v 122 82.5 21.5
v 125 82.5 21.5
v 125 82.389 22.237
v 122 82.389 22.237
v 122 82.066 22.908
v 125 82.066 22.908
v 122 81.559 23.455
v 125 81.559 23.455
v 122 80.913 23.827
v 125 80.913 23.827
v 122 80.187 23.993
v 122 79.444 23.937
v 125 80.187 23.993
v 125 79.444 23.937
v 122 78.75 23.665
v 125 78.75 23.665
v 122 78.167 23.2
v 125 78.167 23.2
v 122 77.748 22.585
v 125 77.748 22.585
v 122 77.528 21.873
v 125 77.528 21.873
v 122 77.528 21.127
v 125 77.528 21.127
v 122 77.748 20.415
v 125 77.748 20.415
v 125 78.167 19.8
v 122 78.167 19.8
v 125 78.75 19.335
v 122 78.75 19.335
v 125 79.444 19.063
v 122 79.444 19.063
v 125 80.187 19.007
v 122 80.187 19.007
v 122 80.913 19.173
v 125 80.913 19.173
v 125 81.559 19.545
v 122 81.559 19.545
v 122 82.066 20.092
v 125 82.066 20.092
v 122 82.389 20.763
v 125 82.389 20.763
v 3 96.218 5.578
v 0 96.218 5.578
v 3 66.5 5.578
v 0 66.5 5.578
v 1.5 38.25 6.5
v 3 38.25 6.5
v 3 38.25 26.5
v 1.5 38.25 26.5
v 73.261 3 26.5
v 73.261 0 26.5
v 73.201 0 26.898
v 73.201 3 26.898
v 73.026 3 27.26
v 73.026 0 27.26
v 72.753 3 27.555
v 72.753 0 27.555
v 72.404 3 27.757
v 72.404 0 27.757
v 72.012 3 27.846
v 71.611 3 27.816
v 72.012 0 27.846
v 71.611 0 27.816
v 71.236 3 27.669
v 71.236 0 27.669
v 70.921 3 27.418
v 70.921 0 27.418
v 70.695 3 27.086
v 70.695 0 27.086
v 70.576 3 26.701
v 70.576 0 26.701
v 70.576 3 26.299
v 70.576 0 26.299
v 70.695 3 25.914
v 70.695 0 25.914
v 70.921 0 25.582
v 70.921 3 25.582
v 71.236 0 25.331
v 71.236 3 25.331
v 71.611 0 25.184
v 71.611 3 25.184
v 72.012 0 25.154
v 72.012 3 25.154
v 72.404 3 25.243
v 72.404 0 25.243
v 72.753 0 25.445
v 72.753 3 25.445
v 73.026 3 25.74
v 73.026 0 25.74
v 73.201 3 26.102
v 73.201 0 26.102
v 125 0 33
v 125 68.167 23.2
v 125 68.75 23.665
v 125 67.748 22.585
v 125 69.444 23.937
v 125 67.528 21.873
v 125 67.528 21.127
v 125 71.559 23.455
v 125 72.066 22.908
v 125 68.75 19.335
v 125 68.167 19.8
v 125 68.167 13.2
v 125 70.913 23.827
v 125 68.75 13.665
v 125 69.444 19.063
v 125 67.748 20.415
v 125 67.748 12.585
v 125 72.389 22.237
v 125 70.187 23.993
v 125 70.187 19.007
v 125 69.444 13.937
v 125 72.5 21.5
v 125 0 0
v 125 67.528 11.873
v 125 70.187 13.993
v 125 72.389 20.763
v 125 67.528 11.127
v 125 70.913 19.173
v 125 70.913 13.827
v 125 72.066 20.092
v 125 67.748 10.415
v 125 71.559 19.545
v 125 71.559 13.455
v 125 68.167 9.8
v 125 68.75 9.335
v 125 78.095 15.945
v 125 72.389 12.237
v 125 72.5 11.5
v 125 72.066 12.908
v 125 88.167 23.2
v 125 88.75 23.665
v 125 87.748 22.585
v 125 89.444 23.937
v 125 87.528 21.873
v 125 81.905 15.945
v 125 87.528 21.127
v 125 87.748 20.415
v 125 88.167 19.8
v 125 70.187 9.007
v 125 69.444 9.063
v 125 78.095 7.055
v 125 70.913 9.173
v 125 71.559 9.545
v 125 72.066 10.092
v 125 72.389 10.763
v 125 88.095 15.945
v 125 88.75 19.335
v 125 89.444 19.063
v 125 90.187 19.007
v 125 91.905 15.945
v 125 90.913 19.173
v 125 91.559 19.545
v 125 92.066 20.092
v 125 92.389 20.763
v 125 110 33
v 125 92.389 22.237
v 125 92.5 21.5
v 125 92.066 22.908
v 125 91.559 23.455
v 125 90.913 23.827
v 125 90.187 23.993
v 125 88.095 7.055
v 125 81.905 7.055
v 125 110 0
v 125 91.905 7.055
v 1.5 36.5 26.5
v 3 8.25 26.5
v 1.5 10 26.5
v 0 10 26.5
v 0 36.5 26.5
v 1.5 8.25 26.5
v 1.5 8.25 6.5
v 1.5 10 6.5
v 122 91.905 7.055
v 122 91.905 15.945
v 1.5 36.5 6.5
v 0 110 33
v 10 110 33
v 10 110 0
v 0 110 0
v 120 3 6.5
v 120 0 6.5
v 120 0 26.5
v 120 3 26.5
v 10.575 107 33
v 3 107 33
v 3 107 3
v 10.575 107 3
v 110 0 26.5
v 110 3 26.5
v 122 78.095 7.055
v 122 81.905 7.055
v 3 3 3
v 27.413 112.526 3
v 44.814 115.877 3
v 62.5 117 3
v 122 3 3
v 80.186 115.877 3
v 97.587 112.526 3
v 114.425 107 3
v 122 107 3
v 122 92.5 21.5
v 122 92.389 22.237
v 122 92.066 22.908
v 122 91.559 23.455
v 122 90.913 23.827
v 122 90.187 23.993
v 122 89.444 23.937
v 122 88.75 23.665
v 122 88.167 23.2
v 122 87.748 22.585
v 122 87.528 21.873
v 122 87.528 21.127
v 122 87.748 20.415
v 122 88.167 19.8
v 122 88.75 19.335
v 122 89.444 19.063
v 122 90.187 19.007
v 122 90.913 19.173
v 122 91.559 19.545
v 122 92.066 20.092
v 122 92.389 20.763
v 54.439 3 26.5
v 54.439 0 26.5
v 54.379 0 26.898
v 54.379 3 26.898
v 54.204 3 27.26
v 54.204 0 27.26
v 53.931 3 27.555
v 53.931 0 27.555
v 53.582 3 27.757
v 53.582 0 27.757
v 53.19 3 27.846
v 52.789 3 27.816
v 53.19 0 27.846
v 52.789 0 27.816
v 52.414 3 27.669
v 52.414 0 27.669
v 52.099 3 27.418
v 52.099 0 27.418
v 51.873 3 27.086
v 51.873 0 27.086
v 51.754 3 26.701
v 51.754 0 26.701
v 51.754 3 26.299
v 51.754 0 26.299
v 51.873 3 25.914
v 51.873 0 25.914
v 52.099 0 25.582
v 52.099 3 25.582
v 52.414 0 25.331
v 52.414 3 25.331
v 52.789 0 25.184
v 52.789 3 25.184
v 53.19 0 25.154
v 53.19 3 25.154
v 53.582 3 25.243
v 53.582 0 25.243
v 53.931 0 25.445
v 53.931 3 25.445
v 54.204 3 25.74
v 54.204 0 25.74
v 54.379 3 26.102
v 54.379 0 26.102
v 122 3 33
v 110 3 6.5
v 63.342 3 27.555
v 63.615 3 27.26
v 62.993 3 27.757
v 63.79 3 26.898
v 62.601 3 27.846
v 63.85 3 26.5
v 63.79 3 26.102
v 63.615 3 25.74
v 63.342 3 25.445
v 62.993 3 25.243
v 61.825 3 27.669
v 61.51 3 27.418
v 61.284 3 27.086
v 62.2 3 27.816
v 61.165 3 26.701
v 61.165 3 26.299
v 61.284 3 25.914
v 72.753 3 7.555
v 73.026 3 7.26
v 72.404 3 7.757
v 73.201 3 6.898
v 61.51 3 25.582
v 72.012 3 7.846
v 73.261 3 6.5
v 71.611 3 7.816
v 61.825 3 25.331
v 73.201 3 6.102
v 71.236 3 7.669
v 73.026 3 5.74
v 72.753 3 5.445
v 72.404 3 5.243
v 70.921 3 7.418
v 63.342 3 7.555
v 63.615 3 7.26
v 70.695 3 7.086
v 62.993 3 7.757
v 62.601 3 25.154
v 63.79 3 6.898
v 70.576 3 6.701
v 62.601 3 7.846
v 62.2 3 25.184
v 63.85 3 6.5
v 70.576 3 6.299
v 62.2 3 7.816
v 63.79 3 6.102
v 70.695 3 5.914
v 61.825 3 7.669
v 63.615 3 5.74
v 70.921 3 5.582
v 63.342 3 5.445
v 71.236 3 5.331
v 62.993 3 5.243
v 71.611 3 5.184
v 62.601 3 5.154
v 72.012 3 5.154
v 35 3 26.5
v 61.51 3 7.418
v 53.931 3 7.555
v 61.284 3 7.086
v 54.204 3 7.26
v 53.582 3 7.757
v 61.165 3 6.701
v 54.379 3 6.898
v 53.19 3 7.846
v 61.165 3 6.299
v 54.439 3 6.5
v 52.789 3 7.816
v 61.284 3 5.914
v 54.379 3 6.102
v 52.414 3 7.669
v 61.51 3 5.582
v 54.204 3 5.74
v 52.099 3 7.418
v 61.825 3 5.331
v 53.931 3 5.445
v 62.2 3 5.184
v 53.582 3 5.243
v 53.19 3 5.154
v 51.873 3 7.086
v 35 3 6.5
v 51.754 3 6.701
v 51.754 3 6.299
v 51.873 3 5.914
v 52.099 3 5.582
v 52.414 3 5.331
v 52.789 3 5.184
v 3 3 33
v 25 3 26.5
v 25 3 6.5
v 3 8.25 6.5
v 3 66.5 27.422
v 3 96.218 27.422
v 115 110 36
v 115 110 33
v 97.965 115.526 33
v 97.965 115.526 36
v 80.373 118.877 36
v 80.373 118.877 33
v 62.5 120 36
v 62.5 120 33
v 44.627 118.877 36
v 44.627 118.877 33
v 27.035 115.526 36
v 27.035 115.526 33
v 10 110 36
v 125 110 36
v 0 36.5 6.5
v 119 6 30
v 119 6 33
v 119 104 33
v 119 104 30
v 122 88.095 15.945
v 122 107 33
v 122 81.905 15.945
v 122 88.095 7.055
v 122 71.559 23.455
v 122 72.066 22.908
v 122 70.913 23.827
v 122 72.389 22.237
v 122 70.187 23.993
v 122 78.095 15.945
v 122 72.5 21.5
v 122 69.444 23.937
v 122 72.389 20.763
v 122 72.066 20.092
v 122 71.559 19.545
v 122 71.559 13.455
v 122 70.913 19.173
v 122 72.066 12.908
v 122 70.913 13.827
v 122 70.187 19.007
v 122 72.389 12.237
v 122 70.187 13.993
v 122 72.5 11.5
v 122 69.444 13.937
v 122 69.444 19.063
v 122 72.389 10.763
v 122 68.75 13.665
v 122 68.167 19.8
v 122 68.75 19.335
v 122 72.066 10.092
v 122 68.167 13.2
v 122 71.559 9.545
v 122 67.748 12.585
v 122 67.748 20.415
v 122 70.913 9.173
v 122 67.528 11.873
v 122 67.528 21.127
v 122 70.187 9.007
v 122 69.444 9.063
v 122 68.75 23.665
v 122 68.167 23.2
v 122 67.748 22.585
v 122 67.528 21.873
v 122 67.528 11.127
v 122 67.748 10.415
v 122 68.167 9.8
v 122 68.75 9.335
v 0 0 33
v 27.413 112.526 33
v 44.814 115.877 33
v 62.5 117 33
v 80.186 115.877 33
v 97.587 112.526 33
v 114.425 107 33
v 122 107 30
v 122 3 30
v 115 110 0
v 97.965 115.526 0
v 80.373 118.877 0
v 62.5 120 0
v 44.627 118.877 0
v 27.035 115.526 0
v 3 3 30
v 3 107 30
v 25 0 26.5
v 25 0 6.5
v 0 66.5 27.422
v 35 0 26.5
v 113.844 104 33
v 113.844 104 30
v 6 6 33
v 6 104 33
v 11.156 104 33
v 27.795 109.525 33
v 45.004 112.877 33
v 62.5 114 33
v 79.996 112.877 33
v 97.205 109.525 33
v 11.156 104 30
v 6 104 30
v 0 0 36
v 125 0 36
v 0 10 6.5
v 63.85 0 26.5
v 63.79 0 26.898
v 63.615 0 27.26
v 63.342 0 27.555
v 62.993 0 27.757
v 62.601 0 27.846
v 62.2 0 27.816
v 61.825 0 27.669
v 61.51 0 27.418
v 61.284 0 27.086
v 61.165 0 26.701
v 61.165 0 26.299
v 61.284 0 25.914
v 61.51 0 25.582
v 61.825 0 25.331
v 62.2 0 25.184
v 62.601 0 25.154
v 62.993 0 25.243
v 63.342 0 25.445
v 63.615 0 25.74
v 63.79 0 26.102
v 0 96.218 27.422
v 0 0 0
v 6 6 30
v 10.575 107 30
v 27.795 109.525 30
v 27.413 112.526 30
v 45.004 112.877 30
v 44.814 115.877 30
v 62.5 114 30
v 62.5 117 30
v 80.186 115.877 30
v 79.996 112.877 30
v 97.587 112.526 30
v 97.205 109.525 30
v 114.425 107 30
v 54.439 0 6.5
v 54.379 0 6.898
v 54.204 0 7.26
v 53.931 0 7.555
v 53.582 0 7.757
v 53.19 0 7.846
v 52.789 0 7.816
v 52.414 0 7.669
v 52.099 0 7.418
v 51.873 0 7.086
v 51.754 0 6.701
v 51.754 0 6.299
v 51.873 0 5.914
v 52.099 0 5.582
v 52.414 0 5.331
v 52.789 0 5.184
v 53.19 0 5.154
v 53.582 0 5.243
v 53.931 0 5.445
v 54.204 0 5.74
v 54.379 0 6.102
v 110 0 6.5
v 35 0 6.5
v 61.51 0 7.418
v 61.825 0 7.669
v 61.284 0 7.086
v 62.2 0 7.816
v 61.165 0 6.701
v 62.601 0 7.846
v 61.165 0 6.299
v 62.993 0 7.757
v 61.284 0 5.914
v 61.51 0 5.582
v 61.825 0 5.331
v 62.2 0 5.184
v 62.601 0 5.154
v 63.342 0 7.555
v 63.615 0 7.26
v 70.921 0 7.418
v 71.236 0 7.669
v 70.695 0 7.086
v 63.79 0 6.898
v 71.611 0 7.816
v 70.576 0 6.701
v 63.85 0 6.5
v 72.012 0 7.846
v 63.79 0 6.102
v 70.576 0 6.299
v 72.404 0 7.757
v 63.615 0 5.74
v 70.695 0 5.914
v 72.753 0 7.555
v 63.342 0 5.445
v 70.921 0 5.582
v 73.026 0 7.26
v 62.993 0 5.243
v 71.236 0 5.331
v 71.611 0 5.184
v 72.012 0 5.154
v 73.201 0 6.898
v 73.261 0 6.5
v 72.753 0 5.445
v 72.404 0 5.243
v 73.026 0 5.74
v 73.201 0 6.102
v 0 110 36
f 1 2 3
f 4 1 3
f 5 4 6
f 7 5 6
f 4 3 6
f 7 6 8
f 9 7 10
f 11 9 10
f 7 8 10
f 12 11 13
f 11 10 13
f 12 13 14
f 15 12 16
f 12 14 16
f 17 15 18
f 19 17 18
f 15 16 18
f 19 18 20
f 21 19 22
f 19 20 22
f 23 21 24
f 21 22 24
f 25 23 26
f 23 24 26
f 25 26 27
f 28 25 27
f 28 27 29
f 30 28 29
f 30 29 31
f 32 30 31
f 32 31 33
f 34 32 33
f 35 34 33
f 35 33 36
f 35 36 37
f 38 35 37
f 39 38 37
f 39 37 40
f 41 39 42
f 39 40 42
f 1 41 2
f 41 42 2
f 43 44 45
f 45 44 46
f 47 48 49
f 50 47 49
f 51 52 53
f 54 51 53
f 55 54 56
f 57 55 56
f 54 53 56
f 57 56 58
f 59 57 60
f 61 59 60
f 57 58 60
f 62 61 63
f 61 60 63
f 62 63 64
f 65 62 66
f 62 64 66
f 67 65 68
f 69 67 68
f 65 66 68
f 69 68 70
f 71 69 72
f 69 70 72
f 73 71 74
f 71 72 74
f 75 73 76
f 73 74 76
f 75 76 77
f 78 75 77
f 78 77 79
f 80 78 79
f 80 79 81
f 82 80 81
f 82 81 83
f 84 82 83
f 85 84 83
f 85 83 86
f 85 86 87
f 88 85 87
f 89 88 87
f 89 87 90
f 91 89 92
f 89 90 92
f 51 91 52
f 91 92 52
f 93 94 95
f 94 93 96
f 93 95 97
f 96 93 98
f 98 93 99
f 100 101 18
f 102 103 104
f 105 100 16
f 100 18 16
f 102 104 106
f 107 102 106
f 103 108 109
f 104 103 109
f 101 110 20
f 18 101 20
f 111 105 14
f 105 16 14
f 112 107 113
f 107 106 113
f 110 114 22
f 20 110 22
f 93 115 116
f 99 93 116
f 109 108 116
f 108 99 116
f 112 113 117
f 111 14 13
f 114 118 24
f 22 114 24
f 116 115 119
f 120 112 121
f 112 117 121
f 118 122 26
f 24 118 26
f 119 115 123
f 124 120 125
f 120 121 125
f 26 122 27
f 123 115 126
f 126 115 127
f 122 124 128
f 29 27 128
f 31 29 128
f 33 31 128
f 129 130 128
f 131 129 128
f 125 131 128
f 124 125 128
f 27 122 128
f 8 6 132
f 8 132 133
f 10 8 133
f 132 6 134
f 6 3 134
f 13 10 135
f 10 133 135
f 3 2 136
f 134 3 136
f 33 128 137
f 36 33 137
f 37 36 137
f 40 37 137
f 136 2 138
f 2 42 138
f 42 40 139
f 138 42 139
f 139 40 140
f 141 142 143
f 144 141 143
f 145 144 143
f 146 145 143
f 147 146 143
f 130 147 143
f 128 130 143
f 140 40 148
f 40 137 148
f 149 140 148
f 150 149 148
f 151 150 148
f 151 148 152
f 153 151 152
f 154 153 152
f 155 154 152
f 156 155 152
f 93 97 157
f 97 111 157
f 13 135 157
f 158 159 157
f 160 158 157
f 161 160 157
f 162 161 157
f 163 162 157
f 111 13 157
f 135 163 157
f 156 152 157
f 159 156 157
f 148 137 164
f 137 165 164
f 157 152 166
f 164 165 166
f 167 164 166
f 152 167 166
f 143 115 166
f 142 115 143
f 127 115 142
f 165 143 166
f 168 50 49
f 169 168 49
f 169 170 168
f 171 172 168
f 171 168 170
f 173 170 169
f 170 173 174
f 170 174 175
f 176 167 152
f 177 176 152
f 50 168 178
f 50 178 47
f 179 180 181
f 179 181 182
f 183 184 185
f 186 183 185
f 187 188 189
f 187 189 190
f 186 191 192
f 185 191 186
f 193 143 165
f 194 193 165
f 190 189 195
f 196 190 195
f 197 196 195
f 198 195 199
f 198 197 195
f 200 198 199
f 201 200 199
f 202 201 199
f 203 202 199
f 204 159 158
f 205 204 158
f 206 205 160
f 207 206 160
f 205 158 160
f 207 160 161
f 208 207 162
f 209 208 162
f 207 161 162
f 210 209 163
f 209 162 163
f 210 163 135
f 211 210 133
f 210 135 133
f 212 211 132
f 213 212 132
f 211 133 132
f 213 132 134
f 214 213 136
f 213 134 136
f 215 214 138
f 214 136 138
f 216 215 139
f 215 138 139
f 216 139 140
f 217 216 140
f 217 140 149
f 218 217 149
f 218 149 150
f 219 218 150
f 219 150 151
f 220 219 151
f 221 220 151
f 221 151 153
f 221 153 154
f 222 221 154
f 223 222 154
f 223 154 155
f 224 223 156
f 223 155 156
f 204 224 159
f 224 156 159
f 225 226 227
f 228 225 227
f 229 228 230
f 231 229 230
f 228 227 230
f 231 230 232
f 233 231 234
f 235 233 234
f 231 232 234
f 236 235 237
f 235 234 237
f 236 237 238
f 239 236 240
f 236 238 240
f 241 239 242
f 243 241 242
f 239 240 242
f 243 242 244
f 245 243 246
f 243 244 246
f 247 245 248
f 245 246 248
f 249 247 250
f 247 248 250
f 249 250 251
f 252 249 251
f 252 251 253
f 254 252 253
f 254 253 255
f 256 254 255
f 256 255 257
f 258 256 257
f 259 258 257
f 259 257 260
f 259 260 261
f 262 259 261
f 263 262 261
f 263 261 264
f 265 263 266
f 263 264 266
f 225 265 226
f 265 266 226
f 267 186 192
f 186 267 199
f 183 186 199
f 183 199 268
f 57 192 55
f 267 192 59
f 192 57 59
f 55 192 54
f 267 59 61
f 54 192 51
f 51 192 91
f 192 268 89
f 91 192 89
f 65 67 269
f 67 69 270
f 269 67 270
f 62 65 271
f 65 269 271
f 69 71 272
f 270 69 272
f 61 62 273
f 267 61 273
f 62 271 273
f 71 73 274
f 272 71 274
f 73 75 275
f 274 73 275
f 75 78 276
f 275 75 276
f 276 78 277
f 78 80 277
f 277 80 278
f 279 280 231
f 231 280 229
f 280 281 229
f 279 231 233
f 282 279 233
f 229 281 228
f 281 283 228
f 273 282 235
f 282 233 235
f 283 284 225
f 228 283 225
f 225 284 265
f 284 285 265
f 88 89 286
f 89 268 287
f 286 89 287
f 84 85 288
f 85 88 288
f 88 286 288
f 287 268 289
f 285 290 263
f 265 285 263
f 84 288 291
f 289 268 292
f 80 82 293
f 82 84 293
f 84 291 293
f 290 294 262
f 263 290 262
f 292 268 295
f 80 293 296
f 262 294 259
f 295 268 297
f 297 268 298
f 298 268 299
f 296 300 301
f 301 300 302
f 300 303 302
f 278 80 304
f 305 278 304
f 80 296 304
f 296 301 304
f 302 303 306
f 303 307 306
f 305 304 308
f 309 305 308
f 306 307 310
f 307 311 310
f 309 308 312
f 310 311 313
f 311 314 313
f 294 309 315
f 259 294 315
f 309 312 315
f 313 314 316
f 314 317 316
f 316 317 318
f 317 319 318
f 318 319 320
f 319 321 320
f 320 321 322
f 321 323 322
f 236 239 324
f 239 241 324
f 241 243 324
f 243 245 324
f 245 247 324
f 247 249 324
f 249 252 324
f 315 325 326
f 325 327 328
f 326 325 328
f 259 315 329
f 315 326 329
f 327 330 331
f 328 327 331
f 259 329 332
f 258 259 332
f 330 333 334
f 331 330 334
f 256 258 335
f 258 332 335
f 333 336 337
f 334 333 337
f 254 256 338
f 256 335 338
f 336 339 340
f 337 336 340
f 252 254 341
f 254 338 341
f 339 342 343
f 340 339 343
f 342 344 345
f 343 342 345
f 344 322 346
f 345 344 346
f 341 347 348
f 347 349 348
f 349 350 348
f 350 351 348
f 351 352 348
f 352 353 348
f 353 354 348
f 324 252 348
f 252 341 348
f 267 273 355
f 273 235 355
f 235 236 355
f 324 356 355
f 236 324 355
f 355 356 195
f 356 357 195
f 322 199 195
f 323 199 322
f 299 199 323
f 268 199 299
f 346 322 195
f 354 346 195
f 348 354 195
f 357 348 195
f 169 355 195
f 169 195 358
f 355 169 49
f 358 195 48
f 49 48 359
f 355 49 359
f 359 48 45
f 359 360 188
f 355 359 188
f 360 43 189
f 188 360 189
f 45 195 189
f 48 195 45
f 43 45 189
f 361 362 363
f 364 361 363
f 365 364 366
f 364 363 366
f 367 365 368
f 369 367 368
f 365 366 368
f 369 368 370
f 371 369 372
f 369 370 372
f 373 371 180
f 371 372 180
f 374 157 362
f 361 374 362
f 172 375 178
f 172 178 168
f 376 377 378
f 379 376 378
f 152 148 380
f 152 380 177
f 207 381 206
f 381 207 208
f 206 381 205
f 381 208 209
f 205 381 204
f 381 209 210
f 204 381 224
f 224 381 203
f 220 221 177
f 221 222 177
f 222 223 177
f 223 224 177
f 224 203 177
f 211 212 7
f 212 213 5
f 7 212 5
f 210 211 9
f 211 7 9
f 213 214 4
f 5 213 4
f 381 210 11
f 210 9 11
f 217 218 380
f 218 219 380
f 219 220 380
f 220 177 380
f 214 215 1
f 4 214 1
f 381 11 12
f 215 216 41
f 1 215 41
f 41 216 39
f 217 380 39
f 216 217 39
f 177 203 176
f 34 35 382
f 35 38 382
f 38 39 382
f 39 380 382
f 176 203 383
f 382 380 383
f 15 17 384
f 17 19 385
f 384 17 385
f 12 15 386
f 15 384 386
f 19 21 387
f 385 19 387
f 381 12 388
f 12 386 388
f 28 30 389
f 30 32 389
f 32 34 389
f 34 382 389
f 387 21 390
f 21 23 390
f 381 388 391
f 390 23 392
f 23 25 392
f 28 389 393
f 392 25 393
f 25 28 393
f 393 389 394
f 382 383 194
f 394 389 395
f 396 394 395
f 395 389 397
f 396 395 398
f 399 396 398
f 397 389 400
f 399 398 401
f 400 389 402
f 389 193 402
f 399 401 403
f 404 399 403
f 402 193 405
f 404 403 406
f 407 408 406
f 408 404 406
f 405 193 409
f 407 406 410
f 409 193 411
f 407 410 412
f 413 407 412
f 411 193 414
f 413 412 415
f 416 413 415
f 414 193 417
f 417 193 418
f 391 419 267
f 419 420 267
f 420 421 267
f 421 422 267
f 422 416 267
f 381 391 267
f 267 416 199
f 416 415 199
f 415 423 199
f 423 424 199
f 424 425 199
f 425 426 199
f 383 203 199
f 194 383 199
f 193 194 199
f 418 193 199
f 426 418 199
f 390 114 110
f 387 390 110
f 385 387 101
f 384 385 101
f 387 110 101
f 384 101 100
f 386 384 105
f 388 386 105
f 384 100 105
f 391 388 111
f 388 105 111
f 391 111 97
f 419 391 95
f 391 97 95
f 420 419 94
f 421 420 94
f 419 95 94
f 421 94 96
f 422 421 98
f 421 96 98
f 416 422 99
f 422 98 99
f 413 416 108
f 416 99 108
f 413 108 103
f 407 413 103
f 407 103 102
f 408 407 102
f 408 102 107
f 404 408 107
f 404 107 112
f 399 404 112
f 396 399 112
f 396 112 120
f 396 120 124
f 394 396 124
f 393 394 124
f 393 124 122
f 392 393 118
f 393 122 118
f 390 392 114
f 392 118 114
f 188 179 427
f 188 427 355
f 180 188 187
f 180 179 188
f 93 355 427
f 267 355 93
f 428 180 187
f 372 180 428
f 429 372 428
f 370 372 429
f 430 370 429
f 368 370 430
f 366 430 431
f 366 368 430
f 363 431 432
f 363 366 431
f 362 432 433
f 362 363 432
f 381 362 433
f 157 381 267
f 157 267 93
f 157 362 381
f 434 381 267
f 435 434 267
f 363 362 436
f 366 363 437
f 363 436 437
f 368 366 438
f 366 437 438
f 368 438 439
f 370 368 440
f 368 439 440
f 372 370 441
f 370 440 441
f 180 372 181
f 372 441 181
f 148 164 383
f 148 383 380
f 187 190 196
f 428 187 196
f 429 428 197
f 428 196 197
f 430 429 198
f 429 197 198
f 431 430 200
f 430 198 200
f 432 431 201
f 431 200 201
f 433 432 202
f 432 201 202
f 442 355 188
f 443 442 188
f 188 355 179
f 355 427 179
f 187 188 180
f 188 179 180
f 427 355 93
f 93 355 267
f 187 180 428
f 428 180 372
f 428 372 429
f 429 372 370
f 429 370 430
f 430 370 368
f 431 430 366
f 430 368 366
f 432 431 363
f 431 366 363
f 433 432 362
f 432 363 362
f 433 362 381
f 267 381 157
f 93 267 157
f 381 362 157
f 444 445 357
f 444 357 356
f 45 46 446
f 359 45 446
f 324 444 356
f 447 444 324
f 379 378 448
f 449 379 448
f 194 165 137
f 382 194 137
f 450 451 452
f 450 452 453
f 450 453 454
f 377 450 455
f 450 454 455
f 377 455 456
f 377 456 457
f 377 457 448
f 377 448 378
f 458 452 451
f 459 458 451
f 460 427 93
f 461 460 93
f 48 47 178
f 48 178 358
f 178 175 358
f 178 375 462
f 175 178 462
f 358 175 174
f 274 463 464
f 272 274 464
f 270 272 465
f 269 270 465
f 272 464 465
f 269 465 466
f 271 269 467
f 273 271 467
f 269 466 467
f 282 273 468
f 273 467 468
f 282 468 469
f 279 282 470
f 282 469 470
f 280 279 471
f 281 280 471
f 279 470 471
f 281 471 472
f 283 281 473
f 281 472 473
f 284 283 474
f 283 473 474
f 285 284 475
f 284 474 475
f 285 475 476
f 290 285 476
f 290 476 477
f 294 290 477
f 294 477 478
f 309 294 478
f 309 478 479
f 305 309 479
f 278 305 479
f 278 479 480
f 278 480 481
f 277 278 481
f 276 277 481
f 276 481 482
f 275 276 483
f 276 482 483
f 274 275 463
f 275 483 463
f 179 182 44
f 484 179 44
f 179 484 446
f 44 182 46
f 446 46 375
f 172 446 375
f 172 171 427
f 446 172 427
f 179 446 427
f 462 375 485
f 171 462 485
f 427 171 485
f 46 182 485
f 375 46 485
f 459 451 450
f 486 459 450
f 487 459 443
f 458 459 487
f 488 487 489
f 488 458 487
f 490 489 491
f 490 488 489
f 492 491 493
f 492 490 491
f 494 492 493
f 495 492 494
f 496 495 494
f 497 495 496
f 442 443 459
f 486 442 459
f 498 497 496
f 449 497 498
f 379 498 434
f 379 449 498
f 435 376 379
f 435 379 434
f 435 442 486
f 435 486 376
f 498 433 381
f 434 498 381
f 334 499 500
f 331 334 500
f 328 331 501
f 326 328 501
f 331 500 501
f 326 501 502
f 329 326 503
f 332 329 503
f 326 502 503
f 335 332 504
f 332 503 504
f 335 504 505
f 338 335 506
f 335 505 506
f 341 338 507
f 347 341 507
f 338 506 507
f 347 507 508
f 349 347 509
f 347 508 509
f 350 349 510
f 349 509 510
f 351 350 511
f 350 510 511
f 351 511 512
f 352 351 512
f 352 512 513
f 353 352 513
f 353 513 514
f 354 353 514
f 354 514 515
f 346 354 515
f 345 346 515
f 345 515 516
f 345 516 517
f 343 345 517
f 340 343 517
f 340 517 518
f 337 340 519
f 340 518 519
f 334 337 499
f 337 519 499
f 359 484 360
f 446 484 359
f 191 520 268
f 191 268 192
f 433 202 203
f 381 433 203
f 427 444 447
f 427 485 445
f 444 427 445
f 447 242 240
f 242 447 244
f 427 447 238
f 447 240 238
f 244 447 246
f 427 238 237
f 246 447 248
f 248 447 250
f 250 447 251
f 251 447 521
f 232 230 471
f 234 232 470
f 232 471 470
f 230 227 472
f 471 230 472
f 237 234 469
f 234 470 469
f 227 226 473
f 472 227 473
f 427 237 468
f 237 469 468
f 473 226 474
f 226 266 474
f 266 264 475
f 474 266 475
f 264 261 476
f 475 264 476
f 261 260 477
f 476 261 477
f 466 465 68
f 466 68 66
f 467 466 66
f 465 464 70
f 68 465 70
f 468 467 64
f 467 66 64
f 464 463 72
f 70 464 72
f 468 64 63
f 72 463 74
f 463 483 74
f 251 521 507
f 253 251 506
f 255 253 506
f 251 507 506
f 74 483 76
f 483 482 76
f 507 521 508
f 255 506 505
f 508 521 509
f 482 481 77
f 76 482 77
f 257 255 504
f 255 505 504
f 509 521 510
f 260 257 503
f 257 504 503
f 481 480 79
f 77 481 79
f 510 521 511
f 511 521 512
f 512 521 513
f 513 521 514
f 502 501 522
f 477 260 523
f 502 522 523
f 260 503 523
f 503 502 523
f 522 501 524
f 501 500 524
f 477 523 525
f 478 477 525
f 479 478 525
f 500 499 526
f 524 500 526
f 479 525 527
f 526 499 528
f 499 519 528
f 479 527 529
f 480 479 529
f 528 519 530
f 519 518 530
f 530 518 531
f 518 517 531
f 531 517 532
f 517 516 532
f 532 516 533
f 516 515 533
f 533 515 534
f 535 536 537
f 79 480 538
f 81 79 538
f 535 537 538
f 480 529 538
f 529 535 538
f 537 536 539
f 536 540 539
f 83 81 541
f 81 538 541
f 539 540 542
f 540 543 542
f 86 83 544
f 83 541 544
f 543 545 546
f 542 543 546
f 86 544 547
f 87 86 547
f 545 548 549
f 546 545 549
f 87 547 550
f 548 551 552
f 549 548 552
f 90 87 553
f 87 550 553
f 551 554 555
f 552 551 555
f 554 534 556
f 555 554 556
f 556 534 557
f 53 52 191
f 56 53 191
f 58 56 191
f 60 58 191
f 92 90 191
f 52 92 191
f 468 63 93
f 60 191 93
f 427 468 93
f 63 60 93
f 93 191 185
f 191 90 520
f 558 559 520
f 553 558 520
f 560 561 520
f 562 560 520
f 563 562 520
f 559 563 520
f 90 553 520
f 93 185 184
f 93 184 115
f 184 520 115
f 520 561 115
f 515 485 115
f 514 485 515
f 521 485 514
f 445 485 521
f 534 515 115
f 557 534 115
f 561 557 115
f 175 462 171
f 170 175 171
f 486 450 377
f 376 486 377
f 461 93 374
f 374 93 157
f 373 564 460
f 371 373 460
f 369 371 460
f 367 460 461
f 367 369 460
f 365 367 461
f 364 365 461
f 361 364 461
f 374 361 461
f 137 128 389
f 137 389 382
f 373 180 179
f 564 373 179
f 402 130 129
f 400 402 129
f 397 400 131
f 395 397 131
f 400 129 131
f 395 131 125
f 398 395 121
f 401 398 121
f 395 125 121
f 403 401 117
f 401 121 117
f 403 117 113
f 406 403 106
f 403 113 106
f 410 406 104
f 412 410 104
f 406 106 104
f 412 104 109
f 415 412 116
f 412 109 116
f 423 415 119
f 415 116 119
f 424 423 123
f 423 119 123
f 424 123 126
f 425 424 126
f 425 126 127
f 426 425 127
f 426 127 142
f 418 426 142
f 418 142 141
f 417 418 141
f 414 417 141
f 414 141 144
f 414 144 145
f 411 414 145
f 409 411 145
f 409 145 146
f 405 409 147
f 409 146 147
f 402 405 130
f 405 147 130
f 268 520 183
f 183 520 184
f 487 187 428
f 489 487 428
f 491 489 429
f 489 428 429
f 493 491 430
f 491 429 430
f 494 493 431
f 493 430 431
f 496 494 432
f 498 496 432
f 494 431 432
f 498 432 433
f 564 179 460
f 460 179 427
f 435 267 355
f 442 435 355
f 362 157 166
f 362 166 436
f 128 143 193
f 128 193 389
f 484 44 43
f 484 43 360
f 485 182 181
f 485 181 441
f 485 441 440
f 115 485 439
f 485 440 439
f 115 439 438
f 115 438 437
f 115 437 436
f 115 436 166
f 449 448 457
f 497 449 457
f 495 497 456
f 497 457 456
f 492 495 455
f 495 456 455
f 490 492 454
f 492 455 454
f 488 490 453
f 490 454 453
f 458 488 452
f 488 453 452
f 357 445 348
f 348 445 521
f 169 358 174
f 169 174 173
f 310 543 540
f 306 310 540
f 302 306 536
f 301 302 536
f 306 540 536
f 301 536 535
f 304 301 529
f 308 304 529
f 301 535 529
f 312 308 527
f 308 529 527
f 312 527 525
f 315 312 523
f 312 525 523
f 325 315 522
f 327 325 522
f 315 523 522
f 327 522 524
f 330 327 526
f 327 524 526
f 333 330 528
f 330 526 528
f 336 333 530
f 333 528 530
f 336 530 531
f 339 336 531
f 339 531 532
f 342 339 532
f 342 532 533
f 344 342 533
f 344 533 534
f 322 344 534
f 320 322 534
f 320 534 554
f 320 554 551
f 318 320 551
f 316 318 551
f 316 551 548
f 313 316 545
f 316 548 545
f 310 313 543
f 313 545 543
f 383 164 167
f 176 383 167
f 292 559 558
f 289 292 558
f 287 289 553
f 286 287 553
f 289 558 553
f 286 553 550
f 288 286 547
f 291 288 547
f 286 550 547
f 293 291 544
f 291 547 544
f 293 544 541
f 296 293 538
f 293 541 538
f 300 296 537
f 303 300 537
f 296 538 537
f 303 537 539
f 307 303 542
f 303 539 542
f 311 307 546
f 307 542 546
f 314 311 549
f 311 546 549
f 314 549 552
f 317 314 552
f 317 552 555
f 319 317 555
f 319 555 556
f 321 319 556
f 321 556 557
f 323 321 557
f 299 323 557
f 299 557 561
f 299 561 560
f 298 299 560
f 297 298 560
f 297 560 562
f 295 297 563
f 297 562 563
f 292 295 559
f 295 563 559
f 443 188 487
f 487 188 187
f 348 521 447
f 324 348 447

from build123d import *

# Parameters (mm, degrees)
F1_DEPTH  = 3
F3_DEPTH  = 30
F4_W      = 26.5
F4_H      = 20
F5_DEPTH  = 3
F6_W      = 30
F6_H      = 20
F7_DEPTH  = 1.5
F8_W      = 29.718
F8_H      = 21.844
F9_DEPTH  = 3
F10_W     = 10
F10_H     = 20
F11_DEPTH = 3
F12_R     = 2.5
F12_W     = 3.81
F12_H     = 8.89
F13_DEPTH = 3
F15_DEPTH = 3
F17_DEPTH = 3
F18_R     = 1.35
F19_DEPTH = 3


with BuildPart() as f1:
    # F0 (on Top) → F1 (new body)
    with BuildSketch(Plane.XY):
        with BuildLine():
            Line((0, 110), (0, 0))
            Line((0, 0), (125, 0))
            Line((125, 0), (125, 110))
            Line((125, 110), (115, 110))
            ThreePointArc((115, 110), (62.5, 120), (10, 110))
            Line((10, 110), (0, 110))
        make_face()
    extrude(amount=F1_DEPTH)

    # F2 (on face) → F3 (join)
    with BuildSketch(Plane.XY.offset(3)):
        with BuildLine():
            ThreePointArc((115, 110), (62.5, 120), (10, 110))
            Line((10, 110), (0, 110))
            Line((0, 110), (0, 0))
            Line((0, 0), (125, 0))
            Line((125, 0), (125, 110))
            Line((125, 110), (115, 110))
        make_face()
        with BuildLine():
            Line((122, 107), (122, 3))
            Line((122, 3), (3, 3))
            Line((3, 3), (3, 107))
            Line((3, 107), (10.5745727028, 107))
            ThreePointArc((10.5745727028, 107), (62.5, 117), (114.4254272972, 107))
            Line((114.4254272972, 107), (122, 107))
        make_face(mode=Mode.SUBTRACT)
    extrude(amount=F3_DEPTH)

    # F4 (on face) → F5 (cut, through all)
    with BuildSketch(Plane(origin=(0, 0, 0), x_dir=(0, -1, 0), z_dir=(-1, 0, 0))):
        with Locations((-23.25, 16.5)):
            Rectangle(F4_W, F4_H)
    extrude(amount=-F5_DEPTH, mode=Mode.SUBTRACT)

    # F6 (on face) → F7 (cut)
    with BuildSketch(Plane.YZ.offset(3)):
        with Locations((23.25, 16.5)):
            Rectangle(F6_W, F6_H)
    extrude(amount=-F7_DEPTH, mode=Mode.SUBTRACT)

    # F8 (on face) → F9 (cut, through all)
    with BuildSketch(Plane(origin=(0, 0, 0), x_dir=(0, -1, 0), z_dir=(-1, 0, 0))):
        with Locations((-81.359, 16.5)):
            Rectangle(F8_W, F8_H)
    extrude(amount=-F9_DEPTH, mode=Mode.SUBTRACT)

    # F10 (on face) → F11 (cut, through all)
    with BuildSketch(Plane.XZ):
        with Locations((30, 16.5)):
            Rectangle(F10_W, F10_H)
        with Locations((115, 16.5)):
            Rectangle(F10_W, F10_H)
    extrude(amount=-F11_DEPTH, mode=Mode.SUBTRACT)

    # F12 (on face) → F13 (cut, through all)
    with BuildSketch(Plane.YZ.offset(125)):
        with Locations((90, 21.5)):
            Circle(F12_R)
        with Locations((80, 21.5)):
            Circle(F12_R)
        with Locations((70, 21.5)):
            Circle(F12_R)
        with Locations((70, 11.5)):
            Circle(F12_R)
        with Locations((80, 11.5)):
            Rectangle(F12_W, F12_H)
        with Locations((90, 11.5)):
            Rectangle(F12_W, F12_H)
    extrude(amount=-F13_DEPTH, mode=Mode.SUBTRACT)

    # F18 (on face) → F19 (cut, through all)
    with BuildSketch(Plane.XZ):
        with Locations((53.089, 6.5)):
            Circle(F18_R)
        with Locations((53.089, 26.5)):
            Circle(F18_R)
        with Locations((62.5, 6.5)):
            Circle(F18_R)
        with Locations((62.5, 26.5)):
            Circle(F18_R)
        with Locations((71.911, 6.5)):
            Circle(F18_R)
        with Locations((71.911, 26.5)):
            Circle(F18_R)
    extrude(amount=-F19_DEPTH, mode=Mode.SUBTRACT)


with BuildPart() as f15:
    # F14 (on face) → F15 (new body)
    with BuildSketch(Plane.XY.offset(33)):
        with BuildLine():
            Line((0, 110), (0, 0))
            Line((0, 0), (125, 0))
            Line((125, 0), (125, 110))
            Line((125, 110), (115, 110))
            ThreePointArc((115, 110), (62.5, 120), (10, 110))
            Line((10, 110), (0, 110))
        make_face()
    extrude(amount=F15_DEPTH)

    # F16 (on face) → F17 (join)
    with BuildSketch(Plane(origin=(0, 0, 33), x_dir=(1, 0, 0), z_dir=(0, 0, -1))):
        with BuildLine():
            Line((3, -3), (3, -107))
            Line((3, -107), (10.5745727028, -107))
            ThreePointArc((10.5745727028, -107), (62.5, -117), (114.4254272972, -107))
            Line((114.4254272972, -107), (122, -107))
            Line((122, -107), (122, -3))
            Line((122, -3), (3, -3))
        make_face()
        with BuildLine():
            Line((119, -6), (119, -104))
            Line((119, -104), (113.8444252086, -104))
            ThreePointArc((113.8444252086, -104), (62.5, -114), (11.1555747914, -104))
            Line((11.1555747914, -104), (6, -104))
            Line((6, -104), (6, -6))
            Line((6, -6), (119, -6))
        make_face(mode=Mode.SUBTRACT)
    extrude(amount=F17_DEPTH)


solid = Compound([f1.part, f15.part])
